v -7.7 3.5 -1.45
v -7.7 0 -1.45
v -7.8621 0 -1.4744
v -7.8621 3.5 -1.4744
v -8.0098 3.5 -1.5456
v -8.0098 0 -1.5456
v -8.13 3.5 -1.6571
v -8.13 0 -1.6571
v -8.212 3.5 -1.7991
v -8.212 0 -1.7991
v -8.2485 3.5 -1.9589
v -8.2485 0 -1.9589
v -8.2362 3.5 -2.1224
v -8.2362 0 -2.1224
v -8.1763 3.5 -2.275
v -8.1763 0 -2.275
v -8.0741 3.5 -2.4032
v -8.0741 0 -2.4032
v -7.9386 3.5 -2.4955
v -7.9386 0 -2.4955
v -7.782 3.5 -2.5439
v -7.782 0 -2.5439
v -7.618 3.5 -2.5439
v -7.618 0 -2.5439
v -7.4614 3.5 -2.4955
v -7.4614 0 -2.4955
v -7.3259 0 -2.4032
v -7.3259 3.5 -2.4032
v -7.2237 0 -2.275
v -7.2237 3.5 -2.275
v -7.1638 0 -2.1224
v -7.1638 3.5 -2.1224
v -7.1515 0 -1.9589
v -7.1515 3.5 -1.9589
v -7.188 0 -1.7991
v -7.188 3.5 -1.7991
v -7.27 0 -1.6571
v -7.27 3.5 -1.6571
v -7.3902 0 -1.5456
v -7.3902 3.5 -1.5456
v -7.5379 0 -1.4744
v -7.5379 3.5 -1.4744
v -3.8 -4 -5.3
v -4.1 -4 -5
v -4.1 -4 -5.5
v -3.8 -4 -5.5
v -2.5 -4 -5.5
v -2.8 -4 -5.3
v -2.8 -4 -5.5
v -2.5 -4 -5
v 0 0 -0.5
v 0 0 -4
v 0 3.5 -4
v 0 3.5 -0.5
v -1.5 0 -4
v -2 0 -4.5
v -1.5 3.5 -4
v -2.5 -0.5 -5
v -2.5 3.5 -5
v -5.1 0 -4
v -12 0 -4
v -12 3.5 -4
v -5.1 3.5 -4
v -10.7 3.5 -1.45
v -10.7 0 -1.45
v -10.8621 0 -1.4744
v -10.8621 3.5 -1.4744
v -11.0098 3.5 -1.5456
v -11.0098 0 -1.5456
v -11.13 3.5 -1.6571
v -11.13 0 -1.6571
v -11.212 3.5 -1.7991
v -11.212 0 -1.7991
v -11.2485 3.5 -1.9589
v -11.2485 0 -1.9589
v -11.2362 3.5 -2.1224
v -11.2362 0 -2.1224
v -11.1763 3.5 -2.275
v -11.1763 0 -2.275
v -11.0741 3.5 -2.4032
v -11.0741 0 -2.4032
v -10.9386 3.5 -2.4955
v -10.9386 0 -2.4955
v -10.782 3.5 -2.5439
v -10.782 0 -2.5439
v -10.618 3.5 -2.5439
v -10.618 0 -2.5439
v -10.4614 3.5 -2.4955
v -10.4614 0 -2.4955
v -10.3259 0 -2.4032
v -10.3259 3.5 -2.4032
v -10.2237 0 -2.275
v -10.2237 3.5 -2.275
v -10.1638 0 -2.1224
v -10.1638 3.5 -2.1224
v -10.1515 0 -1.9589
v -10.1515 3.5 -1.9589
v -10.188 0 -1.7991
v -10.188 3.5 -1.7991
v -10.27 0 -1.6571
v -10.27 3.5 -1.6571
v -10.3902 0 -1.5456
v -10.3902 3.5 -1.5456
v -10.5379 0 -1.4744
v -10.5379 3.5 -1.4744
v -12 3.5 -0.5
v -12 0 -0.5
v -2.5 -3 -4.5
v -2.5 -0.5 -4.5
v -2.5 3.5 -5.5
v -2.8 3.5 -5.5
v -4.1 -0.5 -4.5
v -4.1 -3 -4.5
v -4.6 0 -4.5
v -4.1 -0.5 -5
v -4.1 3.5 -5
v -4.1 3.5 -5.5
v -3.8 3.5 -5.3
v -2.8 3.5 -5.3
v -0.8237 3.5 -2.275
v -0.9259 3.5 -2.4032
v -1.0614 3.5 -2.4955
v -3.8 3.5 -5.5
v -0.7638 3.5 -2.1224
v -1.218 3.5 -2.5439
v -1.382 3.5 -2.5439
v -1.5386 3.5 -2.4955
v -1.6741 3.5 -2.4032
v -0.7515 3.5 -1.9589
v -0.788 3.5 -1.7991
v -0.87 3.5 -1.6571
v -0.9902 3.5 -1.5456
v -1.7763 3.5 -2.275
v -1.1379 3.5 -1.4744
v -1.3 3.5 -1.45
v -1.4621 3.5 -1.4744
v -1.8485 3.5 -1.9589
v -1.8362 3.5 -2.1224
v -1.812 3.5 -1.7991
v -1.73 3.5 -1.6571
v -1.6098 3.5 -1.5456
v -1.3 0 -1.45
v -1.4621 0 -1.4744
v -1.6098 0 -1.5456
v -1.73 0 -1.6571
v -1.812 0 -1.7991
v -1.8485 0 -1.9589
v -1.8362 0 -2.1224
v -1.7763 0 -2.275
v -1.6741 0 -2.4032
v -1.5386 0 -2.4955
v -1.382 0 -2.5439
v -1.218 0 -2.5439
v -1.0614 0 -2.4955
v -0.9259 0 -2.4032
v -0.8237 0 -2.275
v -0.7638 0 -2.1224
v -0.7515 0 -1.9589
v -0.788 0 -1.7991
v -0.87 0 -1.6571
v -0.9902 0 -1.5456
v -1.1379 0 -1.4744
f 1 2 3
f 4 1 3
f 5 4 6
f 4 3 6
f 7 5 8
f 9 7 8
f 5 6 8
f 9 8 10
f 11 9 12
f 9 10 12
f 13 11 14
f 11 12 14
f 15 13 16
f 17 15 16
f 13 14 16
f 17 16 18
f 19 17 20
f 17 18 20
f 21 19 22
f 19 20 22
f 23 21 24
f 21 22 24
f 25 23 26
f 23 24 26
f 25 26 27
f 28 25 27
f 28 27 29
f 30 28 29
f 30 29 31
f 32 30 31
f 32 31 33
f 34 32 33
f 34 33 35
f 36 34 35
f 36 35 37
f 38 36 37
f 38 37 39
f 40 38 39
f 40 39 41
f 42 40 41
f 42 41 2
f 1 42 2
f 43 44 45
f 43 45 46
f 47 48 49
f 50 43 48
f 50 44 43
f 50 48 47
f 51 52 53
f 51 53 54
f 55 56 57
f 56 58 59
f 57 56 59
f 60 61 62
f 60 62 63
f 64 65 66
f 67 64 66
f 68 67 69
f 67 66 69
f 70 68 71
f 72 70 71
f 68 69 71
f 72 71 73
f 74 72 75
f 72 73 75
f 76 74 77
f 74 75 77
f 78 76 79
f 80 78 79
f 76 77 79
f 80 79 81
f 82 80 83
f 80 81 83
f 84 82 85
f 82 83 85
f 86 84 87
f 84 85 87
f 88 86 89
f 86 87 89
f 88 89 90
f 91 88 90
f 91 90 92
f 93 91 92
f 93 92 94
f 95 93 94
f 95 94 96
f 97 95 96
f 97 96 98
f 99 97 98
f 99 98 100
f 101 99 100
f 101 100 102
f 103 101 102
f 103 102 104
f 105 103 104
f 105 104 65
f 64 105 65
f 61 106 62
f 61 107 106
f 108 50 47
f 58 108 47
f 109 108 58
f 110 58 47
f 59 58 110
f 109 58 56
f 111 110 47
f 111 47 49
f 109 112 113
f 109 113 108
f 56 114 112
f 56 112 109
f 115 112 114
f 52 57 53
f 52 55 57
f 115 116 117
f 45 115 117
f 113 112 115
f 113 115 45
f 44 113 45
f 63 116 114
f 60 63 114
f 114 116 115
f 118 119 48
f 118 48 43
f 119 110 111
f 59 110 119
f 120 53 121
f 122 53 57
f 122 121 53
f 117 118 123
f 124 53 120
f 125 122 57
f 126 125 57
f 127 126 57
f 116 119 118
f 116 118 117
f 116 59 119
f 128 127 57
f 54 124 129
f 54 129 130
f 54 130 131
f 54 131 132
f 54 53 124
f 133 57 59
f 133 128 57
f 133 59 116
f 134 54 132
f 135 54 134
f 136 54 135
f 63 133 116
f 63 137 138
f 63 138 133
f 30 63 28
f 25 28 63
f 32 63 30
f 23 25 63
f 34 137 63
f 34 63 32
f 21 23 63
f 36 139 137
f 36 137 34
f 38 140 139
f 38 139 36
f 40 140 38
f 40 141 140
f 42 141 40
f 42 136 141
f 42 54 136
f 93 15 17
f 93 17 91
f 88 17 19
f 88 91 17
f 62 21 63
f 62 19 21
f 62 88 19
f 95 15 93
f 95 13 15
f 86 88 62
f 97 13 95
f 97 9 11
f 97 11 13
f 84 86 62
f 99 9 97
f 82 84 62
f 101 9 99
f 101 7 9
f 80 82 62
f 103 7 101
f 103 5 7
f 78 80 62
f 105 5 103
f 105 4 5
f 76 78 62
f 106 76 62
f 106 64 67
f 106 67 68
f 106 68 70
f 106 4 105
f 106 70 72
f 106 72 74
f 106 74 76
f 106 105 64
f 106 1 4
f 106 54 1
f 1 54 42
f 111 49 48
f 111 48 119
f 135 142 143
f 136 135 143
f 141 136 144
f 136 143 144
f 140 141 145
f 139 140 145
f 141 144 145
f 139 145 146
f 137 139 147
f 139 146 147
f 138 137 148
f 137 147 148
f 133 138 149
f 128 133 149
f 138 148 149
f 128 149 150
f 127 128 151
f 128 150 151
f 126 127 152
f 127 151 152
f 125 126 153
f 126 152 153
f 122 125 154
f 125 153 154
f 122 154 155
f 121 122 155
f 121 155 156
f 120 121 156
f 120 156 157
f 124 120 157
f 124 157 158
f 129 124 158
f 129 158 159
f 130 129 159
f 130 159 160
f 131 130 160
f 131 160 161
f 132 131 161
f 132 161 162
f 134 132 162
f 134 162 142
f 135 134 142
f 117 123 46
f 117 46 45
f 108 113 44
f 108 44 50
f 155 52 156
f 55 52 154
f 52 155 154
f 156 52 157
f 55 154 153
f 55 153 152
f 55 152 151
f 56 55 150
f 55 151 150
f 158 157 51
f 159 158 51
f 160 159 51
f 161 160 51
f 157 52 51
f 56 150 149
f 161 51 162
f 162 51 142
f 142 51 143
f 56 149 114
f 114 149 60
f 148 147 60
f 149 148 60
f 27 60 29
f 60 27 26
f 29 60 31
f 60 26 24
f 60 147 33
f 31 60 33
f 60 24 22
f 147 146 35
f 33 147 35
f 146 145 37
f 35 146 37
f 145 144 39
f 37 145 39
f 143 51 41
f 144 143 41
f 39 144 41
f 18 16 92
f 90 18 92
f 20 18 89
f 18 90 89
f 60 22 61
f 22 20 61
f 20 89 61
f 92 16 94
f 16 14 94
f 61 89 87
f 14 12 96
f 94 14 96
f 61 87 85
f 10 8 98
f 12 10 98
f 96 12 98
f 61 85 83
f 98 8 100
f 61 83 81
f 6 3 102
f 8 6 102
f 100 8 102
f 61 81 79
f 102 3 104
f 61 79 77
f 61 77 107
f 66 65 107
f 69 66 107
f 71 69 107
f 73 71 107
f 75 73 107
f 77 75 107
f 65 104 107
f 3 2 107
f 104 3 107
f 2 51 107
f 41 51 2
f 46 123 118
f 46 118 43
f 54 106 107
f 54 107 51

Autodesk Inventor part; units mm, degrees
ref_plane "YZ Plane" through (0, 0, 0) normal (1, 0, 0) x (0, 1, 0)
ref_plane "XZ Plane" through (0, 0, 0) normal (0, 1, 0) x (-1, 0, 0)
ref_plane "XY Plane" through (0, 0, 0) normal (0, 0, 1) x (1, 0, 0)
sketch "스케치1" plane through (0, 0, 0) normal (0, 1, 0) x (-1, 0, 0)
  line L0 (0, 0) -> (12, 0)
  line L1 (12, 0) -> (12, -4)
  line L2 (12, -4) -> (0, -4)
  line L3 (0, -4) -> (0, 0)
  dimension "d0" = 12
  dimension "d1" = 4
extrude "돌출1" add sketch "스케치1" along normal blind 3.5
sketch "스케치2" plane through (0, 3.5, 0) normal (0, 1, 0) x (1, 0, 0)
  line L0 (0, 0) -> (0, 4) construction
  line L1 (0, 2) -> (-12, 2) construction
  line L2 (-12, 4) -> (-12, 0) construction
  point P0 (-1.3, 2)
  point P1 (-7.7, 2)
  point P2 (-10.7, 2)
  dimension "d59" = 1.3
  dimension "d60" = 3
  dimension "d62" = 1.3
hole "구멍1" at (-10.7, 3.5, -2) at (-1.3, 3.5, -2) direction (0, -1, 0) diameter 1.1 end through all
hole "구멍2" at (-7.7, 3.5, -2) direction (0, -1, 0) diameter 1.1 end through all
sketch "스케치11" plane through (0, 0, -4) normal (0, 0, -1) x (-1, 0, 0)
  line L0 (0, 0) -> (12, 0) projected
  line L1 (0, 0) -> (0, 3.5) projected
  line L2 (12, 3.5) -> (0, 3.5) projected
  line L3 (12, 0) -> (12, 3.5) projected
  line L4 (12, 3.5) -> (0, 3.5) projected
  line L5 (2.5, 3.5) -> (4.1, 3.5)
  line L6 (4.1, 3.5) -> (4.1, -4)
  line L7 (4.1, -4) -> (2.5, -4)
  line L8 (2.5, -4) -> (2.5, 3.5)
  dimension "d99" = 1.6
  dimension "d100" = 4
  dimension "d124" = 2.5
extrude "돌출9" add sketch "스케치11" along normal blind 1.5 contours L8 L2 L6 L0 | L0 L6 L7 L8
chamfer "모따기6" distance 1 angle 45 2 edges at (-2.5, 1.75, -4) (-4.1, 1.75, -4)
chamfer "모따기7" distance 0.5 angle 45 2 edges at (-2.5, 0, -4.5) (-4.1, 0, -4.5)
sketch "스케치12" plane through (0, 0, -5.5) normal (0, 0, -1) x (-1, 0, 0)
  line L0 (4.1, 3.5) -> (2.5, 3.5) projected
  line L1 (2.5, 3.5) -> (2.5, -4) projected
  line L2 (2.5, -4) -> (4.1, -4) projected
  line L3 (4.1, -4) -> (4.1, 3.5) projected
  line L4 (2.8, -4) -> (2.8, 3.5)
  line L5 (12, 3.5) -> (0, 3.5) projected
  line L6 (3.8, 3.5) -> (3.8, -4)
  line L7 (2.5, -4) -> (4.1, -4) projected
  point P0 (0, 0)
  point P1 (3.8, -4)
  dimension "d110" = 1
  dimension "d111" = 0.3
  dimension "d112" = 0.3
extrude "돌출10" cut sketch "스케치12" against normal blind 0.2 contours L6 L2 L4 L0
sketch "스케치13" plane through (0, 0, -4) normal (0, 0, 1) x (1, 0, 0)
  line L0 (-4.6, 0) -> (-2, 0) projected
  line L1 (-4.1, -0.5) -> (-4.6, 0) projected
  line L2 (-4.1, -4) -> (-4.1, -0.5) projected
  line L3 (-2.5, -4) -> (-4.1, -4) projected
  line L4 (-2.5, -0.5) -> (-2.5, -4) projected
  line L5 (-2, 0) -> (-2.5, -0.5) projected
  point P0 (0, 0)
extrude "돌출11" cut sketch "스케치13" against normal blind 0.5
chamfer "모따기8" distance 0.5 distance2 1 1 edges at (-3.3, -4, -4.5) measured on face at (-3.1333, -4, -4.7667)
sketch "스케치14" plane through (-12, 0, 0) normal (0, 0, 1) x (1, 0, 0)
  line L0 (12, 0) -> (0, 0) projected
  line L1 (12, 0) -> (12, 3.5) projected
  line L2 (0, 3.5) -> (12, 3.5) projected
  line L3 (0, 0) -> (0, 3.5) projected
extrude "돌출12" cut sketch "스케치14" against normal blind 0.5
equation "\"d111\" = d112"
equation "\"G23_F\" = 0.65"
equation "\"G23_M\" = 0.67"
equation "\"Screw_F\" = 1.3"
equation "\"Screw_M\" = 1.6"
properties part number "_3D 인쇄"
